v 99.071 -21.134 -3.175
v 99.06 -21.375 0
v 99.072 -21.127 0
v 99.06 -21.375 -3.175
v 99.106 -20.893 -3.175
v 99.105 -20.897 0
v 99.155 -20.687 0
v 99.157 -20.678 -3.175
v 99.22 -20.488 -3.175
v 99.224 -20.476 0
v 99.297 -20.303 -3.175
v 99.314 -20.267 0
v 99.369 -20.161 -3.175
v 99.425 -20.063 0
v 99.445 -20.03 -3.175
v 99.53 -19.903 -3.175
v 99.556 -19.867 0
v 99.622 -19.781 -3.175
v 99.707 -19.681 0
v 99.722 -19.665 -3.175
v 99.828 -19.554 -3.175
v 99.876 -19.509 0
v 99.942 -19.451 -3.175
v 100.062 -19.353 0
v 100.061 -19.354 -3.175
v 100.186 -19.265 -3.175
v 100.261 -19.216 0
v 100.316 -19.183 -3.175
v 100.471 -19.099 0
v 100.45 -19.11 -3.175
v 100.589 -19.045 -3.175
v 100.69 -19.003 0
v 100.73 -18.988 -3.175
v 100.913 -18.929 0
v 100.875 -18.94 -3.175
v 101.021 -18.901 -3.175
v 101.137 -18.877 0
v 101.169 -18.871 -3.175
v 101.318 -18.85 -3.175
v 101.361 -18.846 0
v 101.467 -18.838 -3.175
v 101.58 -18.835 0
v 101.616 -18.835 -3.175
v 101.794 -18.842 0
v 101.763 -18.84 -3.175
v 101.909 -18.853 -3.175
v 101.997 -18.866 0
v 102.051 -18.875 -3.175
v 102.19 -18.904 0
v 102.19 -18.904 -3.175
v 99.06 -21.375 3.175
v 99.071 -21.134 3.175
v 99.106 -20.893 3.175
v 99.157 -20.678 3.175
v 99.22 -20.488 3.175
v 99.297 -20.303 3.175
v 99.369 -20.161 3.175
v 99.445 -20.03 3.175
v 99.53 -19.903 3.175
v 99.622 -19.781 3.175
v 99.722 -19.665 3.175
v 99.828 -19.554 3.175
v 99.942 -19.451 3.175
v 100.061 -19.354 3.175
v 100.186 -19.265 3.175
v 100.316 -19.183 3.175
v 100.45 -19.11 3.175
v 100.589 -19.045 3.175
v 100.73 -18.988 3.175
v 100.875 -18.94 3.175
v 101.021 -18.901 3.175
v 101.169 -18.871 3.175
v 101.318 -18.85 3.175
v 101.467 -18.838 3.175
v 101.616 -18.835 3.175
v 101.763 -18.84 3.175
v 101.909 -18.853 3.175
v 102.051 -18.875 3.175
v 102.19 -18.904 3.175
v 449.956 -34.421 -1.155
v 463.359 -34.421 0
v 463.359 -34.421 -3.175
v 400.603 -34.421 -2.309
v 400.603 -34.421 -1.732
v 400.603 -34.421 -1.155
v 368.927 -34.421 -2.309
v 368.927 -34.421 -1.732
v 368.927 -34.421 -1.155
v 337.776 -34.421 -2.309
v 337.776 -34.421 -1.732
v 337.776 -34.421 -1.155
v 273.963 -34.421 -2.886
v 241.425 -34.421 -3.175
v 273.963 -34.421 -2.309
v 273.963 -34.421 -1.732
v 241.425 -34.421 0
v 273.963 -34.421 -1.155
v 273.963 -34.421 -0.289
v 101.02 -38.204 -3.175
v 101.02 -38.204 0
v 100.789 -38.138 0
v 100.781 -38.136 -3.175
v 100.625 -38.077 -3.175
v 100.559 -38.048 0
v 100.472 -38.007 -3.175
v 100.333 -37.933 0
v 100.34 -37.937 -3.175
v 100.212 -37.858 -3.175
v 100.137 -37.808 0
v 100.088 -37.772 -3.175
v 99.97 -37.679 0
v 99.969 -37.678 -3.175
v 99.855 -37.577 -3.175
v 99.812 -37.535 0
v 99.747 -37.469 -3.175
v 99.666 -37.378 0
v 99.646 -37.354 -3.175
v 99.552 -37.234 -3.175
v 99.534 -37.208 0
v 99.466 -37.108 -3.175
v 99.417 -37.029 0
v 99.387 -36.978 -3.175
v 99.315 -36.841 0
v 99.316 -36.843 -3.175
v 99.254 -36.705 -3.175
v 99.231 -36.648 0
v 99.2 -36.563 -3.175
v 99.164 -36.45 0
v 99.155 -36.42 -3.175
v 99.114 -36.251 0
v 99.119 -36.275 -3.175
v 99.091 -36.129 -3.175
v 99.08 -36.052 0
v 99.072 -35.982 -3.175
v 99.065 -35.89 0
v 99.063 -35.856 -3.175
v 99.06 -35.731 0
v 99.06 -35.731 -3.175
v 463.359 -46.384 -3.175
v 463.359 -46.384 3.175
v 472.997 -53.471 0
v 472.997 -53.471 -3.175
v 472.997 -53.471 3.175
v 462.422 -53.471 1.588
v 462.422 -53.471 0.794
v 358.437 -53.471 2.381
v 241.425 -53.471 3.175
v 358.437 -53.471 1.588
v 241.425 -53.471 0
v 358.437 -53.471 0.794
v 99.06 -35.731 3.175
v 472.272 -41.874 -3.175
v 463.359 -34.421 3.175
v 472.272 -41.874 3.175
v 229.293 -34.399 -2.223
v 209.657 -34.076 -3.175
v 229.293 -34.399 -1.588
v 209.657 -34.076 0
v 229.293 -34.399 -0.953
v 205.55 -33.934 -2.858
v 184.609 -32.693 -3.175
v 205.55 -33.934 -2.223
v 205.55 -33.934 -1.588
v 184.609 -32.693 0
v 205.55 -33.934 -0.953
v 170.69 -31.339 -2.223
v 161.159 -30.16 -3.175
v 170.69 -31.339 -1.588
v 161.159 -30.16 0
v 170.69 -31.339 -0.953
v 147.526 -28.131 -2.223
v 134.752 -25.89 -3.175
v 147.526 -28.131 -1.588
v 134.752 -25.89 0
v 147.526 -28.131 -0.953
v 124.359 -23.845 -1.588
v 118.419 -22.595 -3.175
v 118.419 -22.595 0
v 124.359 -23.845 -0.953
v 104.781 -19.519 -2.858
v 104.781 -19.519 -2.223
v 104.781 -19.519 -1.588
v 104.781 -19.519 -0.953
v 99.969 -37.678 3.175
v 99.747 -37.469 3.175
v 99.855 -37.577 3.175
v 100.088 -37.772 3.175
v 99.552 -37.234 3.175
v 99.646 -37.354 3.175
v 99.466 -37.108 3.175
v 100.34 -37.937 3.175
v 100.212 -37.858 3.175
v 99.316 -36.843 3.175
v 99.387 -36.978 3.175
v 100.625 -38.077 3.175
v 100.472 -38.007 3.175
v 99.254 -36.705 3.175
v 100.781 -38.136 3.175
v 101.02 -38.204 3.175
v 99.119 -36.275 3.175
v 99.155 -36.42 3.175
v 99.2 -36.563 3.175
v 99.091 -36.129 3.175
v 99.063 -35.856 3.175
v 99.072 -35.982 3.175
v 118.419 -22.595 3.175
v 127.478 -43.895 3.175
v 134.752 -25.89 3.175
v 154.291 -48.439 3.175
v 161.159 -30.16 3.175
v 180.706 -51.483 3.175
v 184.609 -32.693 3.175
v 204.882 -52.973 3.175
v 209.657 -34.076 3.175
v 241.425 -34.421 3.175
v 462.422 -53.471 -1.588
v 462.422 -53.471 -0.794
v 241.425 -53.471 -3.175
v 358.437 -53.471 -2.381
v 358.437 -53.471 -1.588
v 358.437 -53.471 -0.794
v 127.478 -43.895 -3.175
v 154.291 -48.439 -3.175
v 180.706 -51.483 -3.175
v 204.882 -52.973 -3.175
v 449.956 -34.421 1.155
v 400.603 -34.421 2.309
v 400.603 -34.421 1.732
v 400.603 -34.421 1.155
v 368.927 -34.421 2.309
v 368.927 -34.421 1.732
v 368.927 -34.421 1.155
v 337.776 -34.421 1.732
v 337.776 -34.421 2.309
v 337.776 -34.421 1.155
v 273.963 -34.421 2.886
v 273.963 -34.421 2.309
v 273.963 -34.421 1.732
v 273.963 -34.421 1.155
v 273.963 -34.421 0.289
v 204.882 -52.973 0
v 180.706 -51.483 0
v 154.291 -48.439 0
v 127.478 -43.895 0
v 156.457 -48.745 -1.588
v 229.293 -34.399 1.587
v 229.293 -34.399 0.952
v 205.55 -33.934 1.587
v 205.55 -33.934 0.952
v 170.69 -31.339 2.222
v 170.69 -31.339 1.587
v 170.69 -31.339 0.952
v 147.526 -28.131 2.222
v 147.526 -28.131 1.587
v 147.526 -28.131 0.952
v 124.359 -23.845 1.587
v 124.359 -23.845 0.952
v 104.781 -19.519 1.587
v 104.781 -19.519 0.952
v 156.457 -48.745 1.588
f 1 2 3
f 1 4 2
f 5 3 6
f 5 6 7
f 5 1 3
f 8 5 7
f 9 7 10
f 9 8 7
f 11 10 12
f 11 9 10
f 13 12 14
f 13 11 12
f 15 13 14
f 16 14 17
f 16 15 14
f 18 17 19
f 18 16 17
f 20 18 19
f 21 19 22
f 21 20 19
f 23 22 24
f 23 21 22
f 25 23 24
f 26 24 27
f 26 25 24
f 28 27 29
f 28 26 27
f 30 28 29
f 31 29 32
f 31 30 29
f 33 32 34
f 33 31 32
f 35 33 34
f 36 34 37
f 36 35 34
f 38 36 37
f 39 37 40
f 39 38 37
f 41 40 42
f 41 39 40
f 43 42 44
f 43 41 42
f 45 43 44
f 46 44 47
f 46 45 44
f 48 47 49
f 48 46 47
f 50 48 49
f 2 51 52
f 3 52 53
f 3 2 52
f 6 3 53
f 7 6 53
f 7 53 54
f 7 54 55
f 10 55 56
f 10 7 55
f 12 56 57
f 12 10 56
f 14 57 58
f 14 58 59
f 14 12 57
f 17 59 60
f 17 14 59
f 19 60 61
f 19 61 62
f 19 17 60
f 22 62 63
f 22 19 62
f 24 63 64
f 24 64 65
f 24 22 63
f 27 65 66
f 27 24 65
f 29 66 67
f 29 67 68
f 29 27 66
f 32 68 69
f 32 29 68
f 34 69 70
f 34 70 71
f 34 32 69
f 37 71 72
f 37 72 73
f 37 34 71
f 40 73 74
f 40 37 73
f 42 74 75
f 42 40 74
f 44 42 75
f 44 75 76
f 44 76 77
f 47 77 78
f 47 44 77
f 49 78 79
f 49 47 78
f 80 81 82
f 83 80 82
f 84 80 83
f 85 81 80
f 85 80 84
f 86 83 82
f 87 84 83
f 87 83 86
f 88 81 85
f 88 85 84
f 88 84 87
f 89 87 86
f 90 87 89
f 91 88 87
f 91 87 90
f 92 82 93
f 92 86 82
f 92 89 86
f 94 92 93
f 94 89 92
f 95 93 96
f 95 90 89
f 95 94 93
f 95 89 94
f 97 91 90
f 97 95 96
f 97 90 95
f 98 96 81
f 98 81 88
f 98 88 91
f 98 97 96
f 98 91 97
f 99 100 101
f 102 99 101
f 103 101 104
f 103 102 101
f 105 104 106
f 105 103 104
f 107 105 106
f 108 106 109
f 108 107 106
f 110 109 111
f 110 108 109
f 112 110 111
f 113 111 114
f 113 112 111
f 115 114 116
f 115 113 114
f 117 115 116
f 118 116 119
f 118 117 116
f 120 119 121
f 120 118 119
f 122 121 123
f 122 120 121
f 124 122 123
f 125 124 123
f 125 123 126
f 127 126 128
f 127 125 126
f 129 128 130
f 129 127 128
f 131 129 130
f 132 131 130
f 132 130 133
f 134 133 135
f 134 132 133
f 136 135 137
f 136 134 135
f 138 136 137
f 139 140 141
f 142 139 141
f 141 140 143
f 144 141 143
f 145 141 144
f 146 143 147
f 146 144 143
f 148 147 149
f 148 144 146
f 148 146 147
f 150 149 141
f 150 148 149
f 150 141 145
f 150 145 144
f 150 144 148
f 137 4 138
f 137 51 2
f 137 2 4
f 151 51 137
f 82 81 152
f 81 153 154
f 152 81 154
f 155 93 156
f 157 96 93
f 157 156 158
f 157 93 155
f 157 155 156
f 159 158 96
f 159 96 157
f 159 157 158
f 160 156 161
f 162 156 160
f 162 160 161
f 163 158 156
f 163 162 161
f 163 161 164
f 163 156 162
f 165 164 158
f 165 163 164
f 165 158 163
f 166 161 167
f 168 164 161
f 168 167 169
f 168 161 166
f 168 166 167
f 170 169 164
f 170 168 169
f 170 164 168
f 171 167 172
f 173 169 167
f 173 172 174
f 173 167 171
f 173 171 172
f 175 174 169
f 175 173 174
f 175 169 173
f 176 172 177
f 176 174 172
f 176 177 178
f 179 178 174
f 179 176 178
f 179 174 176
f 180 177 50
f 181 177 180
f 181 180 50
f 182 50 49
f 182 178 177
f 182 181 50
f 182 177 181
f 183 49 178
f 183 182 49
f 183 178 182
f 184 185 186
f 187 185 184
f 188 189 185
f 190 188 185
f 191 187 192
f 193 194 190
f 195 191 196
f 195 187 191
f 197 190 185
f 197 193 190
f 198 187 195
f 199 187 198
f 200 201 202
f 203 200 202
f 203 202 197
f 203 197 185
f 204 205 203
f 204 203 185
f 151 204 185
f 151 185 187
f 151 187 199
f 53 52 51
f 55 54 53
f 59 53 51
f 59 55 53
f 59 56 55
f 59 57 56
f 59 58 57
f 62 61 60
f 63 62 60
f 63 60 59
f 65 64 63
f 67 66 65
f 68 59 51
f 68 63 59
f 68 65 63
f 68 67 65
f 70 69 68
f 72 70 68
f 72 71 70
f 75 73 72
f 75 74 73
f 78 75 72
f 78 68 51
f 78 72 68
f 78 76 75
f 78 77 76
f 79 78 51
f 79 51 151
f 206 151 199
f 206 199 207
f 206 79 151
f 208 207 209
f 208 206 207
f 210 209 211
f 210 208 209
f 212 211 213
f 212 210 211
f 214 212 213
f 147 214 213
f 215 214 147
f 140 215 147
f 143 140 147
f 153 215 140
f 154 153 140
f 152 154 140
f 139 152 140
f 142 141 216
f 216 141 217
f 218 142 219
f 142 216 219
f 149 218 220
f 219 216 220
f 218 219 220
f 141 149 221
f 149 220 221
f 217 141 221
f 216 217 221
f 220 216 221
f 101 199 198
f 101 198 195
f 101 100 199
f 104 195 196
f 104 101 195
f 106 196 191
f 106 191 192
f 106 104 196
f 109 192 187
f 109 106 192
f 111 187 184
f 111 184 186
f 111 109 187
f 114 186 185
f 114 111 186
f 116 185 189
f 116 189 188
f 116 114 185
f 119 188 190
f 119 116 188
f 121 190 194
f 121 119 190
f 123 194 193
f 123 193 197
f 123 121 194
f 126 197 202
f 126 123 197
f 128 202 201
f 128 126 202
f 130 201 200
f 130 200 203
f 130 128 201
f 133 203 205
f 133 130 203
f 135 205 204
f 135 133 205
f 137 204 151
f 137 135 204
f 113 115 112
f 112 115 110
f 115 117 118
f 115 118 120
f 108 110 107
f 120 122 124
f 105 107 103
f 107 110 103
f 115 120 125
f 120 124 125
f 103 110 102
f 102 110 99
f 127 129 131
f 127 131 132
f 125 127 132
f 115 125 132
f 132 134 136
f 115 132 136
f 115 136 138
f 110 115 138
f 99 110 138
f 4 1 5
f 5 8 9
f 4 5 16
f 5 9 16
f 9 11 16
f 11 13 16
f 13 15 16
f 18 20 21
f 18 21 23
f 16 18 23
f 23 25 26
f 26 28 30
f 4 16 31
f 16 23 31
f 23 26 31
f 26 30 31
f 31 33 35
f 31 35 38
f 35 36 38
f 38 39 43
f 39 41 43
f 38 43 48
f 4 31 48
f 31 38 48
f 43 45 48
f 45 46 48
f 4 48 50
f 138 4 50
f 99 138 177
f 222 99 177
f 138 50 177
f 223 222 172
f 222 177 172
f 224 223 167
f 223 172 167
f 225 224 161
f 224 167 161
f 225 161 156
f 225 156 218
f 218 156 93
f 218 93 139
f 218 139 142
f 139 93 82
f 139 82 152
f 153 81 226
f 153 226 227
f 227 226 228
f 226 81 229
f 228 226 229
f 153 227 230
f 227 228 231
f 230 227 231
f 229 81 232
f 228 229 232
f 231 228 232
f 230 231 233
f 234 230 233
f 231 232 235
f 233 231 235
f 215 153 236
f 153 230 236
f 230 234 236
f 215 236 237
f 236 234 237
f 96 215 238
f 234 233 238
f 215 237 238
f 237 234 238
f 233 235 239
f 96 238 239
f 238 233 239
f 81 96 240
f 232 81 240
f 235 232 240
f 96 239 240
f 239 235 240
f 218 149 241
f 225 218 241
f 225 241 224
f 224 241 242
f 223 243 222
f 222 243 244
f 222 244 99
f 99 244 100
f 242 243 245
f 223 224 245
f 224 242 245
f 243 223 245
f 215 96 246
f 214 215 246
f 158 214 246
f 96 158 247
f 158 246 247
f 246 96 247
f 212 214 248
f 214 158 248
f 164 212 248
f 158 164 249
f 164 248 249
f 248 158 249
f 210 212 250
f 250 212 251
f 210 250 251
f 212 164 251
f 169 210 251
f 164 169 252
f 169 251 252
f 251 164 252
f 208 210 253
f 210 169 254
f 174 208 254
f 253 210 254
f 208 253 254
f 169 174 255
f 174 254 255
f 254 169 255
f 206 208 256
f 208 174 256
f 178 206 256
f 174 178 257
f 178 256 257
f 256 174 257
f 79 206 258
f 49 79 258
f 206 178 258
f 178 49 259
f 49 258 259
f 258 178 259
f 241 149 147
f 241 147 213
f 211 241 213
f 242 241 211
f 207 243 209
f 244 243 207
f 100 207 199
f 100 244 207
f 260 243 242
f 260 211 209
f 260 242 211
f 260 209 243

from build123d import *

# Parameters (mm, degrees)
BOSS_EXTRUDE1_DEPTH = 3.175
CUT_EXTRUDE1_DEPTH  = 7.3500001
FILLET1_R           = 2.54
CUT_EXTRUDE2_DEPTH  = 7.62


with BuildPart() as part:
    # Sketch1 → Boss-Extrude1 (new body, symmetric)
    with BuildSketch(Plane.XY):
        with BuildLine():
            Line((499.61002795, -53.470702797), (1046.28548189, -53.470702797))
            add(Edge.make_bspline(
                [(2669.54, -9.569049356), (2615.393603553, -13.17073937), (2561.080658619, -16.536108081), (2506.205230446, -19.758621957), (2430.209106802, -23.505211705), (2354.212983157, -26.631486423), (2332.570330468, -27.480988169), (2156.268639429, -34.377768543), (1979.966947376, -41.628631248), (1824.114277635, -52.771265877), (1636.928606778, -53.579569849), (1449.742935921, -53.454024613), (1418.006730935, -53.470702797), (1324.899336146, -53.470702797), (1231.791940344, -53.470702797), (1170.441269319, -53.470702797), (1108.784075813, -53.470702797), (1047.126882346, -53.470702797), (1046.846414188, -53.470702797), (1046.565947184, -53.470702797), (1046.28548189, -53.470702797)],
                knots=[103.698913506, 103.698913506, 103.698913506, 103.698913506, 103.698913506, 103.698913506, 130.927896619, 130.927896619, 130.927896619, 141.337054719, 141.337054719, 141.337054719, 218.101815019, 218.101815019, 218.101815019, 233.772059419, 233.772059419, 233.772059419, 264.077723219, 264.077723219, 264.077723219, 264.2162088, 264.2162088, 264.2162088, 264.2162088, 264.2162088, 264.2162088], degree=5))
            Line((2669.54, -9.569049356), (2669.54, 9.5231025))
            add(Edge.make_bspline(
                [(2669.54, 9.5231025), (2667.126494524, 9.36235515), (2659.861586685, 8.880281494), (2635.666282302, 7.292469146), (2596.857665529, 4.826056853), (2545.729743039, 1.758344093), (2494.405305707, -1.098555235), (2451.533022267, -3.266573297), (2417.198316756, -4.86708361), (2391.457076919, -6.003589235), (2365.634736307, -7.086854581), (2339.546284672, -8.137729944), (2313.466132974, -9.165138371), (2287.612375486, -10.179478215), (2261.763347437, -11.201032297), (2227.285329715, -12.583842557), (2184.175569393, -14.36607236), (2132.429066114, -16.607427868), (2063.4255234, -19.708920485), (1977.174907635, -23.700543313), (1873.732451432, -28.149389221), (1770.37461881, -31.657468649), (1667.085687813, -33.793117556), (1581.011094491, -34.383188831), (1512.07397126, -34.4278026), (1443.061513477, -34.409510402), (1356.800927879, -34.424432812), (1218.794626954, -34.418464788), (1115.289022786, -34.420702797), (1046.28548189, -34.420702797)],
                knots=[103.571582669, 103.571582669, 103.571582669, 103.571582669, 104.300777207, 105.766098403, 110.877392287, 115.98868617, 121.099980054, 126.211273938, 128.76692088, 131.322567822, 133.878214764, 136.433861706, 138.989508647, 141.545155589, 144.100802531, 146.656449473, 151.767743357, 156.879037241, 161.990331124, 172.212918892, 182.43550666, 192.658094427, 202.880682195, 213.103269962, 218.214563846, 223.32585773, 233.548445497, 243.771033265, 264.2162088, 264.2162088, 264.2162088, 264.2162088], degree=3))
            Line((1046.28548189, -34.420702797), (499.61002795, -34.420702797))
            add(Edge.make_bspline(
                [(499.61002795, -34.420702797), (488.614737518, -34.420702797), (472.236395365, -34.420702798), (449.940231846, -34.420702794), (427.771305695, -34.42070281), (405.874681663, -34.420702712), (384.584909128, -34.420702942), (368.900229326, -34.420702244), (353.376568613, -34.420704862), (332.608466435, -34.420689186), (306.287754853, -34.420570006), (274.023487704, -34.420538256), (252.271015965, -34.420709741), (241.425150134, -34.420702761)],
                knots=[19.90682951, 19.90682951, 19.90682951, 19.90682951, 23.220120017, 24.876765271, 26.533410525, 29.846701033, 31.503346286, 33.15999154, 34.816636794, 36.473282048, 39.786572556, 43.099863063, 46.413153571, 46.413153571, 46.413153571, 46.413153571], degree=3))
            add(Edge.make_bspline(
                [(241.425150134, -34.420702761), (239.394928853, -34.420701455), (235.322322927, -34.420495867), (227.274423443, -34.398702533), (217.319360062, -34.297466855), (205.530690077, -33.976385563), (189.963341914, -33.212641271), (170.696984653, -31.543495194), (147.533261232, -28.314398128), (125.482753206, -24.202109872), (109.358914834, -20.622537553), (100.964116069, -18.612521054), (99.06, -18.149327722)],
                knots=[0, 0, 0, 0, 0.622088422, 1.244176844, 2.488353689, 3.732530533, 4.976707377, 7.465061066, 9.953414755, 12.441768444, 14.55823542, 15.180323842, 15.180323842, 15.180323842, 15.180323842], degree=3))
            Line((99.06, -18.149327722), (99.06, -37.741485304))
            add(Edge.make_bspline(
                [(241.425137875, -53.470702761), (224.286916993, -53.470691732), (207.149474967, -53.467315374), (190.203897513, -52.686577078), (161.734965878, -49.987457476), (133.266034188, -45.175583375), (121.749620566, -42.910592695), (110.349390726, -40.420274627), (99.06, -37.741485304)],
                knots=[0, 0, 0, 0, 0, 0, 8.71381608, 8.71381608, 8.71381608, 14.701907176, 14.701907176, 14.701907176, 14.701907176, 14.701907176, 14.701907176], degree=5))
            add(Edge.make_bspline(
                [(499.61002795, -53.470702797), (492.136820835, -53.470702797), (484.754348064, -53.470702797), (477.443025859, -53.470702797), (448.516583145, -53.470702797), (419.590140517, -53.470702797), (398.368118521, -53.470702797), (355.647540186, -53.470702797), (312.926961851, -53.470702797), (289.235090436, -53.470293029), (265.364963651, -53.470705034), (241.4948369, -53.470702789), (241.471603891, -53.470702785), (241.448370882, -53.470702776), (241.425137875, -53.470702761)],
                knots=[19.90682951, 19.90682951, 19.90682951, 19.90682951, 19.90682951, 19.90682951, 23.637897311, 23.637897311, 23.637897311, 34.276545571, 34.276545571, 34.276545571, 46.401340901, 46.401340901, 46.401340901, 46.413153571, 46.413153571, 46.413153571, 46.413153571, 46.413153571, 46.413153571], degree=5))
        make_face()
    extrude(amount=BOSS_EXTRUDE1_DEPTH, both=True)

    # Sketch2 → Cut-Extrude1 (cut, through all)
    with BuildSketch(Plane.XY.offset(3.175)):
        with BuildLine():
            add(Edge.make_bspline(
                [(2312.9875, -9.183260037), (2304.505441691, -9.516700376), (2287.441020622, -10.186250162), (2261.763347437, -11.201032297), (2228.230552004, -12.545932515), (2203.310445107, -13.575047161), (2187.00995947, -14.263260037)],
                knots=[139.04033329, 139.04033329, 139.04033329, 139.04033329, 141.545155589, 144.100802531, 146.656449473, 151.487488909, 151.487488909, 151.487488909, 151.487488909], degree=3))
            Line((2187.00995947, -14.263260037), (2312.9875, -14.263260037))
            Line((2312.9875, -14.263260037), (2312.9875, -9.183260037))
        make_face()
    extrude(amount=-CUT_EXTRUDE1_DEPTH, mode=Mode.SUBTRACT)

    # Fillet1
    fillet1_edges = [part.edges().sort_by_distance(p)[0] for p in [
        (2669.54, -9.569049356, -1.5875),
        (2669.54, 9.5231025, -1.5875),
        (99.06, -37.741485304, -1.5875),
        (99.06, -18.149327722, -1.5875),
        (2312.9875, -9.183260037, 1.5875),
        (2312.9875, -14.263260037, 0),
    ]]
    fillet(fillet1_edges, radius=FILLET1_R)

    # Sketch3 → Cut-Extrude2 (cut)
    with BuildSketch(Plane.XY.offset(3.175)):
        Polygon((463.358597157, -34.420702797), (472.271656585, -41.874419167), (463.358597157, -46.384200616), (472.997412797, -53.470702797), (510.09583662, -269.844988776), (2795.524214409, -269.844988776), (2811.168313051, 250.910269335), (463.358597157, 321.441226467), align=None)
    extrude(amount=-CUT_EXTRUDE2_DEPTH, mode=Mode.SUBTRACT)


solid = part.part
